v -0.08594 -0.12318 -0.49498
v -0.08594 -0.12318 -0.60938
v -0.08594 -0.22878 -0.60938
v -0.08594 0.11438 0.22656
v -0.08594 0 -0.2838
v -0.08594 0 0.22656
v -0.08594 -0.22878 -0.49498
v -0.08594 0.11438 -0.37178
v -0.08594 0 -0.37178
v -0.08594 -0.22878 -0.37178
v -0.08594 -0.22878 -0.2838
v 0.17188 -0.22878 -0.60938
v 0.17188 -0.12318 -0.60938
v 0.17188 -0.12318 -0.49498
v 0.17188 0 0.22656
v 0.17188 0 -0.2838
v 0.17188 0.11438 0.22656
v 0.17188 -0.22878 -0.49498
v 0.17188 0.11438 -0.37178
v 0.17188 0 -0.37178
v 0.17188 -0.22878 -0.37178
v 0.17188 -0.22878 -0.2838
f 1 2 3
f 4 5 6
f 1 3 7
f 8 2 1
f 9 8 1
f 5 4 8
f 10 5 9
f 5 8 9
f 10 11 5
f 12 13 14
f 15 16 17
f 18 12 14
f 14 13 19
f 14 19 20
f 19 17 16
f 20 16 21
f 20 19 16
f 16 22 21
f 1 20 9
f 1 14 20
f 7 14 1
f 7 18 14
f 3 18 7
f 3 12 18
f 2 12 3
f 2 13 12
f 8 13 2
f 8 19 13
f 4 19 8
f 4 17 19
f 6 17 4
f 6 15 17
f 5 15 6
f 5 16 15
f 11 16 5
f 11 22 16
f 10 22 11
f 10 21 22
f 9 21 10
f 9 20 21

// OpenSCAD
EPS = 0.01;

translate([-0.0859375, 0.0, 0.2265625])
rotate([0, 90, 0])
linear_extrude(height=0.2578125)
    polygon(points=[
        [0.5103618421052631, 0.0],
        [0.5103618421052631, -0.2287828947368421],
        [0.5983552631578947, -0.2287828947368421],
        [0.5983552631578947, 0.0],
        [0.7215460526315789, -0.1231907894736842],
        [0.7215460526315789, -0.2287828947368421],
        [0.8359375, -0.2287828947368421],
        [0.8359375, -0.1231907894736842],
        [0.5983552631578947, 0.11439144736842105],
        [0.0, 0.11439144736842105],
        [0.0, 0.0]
    ]);
